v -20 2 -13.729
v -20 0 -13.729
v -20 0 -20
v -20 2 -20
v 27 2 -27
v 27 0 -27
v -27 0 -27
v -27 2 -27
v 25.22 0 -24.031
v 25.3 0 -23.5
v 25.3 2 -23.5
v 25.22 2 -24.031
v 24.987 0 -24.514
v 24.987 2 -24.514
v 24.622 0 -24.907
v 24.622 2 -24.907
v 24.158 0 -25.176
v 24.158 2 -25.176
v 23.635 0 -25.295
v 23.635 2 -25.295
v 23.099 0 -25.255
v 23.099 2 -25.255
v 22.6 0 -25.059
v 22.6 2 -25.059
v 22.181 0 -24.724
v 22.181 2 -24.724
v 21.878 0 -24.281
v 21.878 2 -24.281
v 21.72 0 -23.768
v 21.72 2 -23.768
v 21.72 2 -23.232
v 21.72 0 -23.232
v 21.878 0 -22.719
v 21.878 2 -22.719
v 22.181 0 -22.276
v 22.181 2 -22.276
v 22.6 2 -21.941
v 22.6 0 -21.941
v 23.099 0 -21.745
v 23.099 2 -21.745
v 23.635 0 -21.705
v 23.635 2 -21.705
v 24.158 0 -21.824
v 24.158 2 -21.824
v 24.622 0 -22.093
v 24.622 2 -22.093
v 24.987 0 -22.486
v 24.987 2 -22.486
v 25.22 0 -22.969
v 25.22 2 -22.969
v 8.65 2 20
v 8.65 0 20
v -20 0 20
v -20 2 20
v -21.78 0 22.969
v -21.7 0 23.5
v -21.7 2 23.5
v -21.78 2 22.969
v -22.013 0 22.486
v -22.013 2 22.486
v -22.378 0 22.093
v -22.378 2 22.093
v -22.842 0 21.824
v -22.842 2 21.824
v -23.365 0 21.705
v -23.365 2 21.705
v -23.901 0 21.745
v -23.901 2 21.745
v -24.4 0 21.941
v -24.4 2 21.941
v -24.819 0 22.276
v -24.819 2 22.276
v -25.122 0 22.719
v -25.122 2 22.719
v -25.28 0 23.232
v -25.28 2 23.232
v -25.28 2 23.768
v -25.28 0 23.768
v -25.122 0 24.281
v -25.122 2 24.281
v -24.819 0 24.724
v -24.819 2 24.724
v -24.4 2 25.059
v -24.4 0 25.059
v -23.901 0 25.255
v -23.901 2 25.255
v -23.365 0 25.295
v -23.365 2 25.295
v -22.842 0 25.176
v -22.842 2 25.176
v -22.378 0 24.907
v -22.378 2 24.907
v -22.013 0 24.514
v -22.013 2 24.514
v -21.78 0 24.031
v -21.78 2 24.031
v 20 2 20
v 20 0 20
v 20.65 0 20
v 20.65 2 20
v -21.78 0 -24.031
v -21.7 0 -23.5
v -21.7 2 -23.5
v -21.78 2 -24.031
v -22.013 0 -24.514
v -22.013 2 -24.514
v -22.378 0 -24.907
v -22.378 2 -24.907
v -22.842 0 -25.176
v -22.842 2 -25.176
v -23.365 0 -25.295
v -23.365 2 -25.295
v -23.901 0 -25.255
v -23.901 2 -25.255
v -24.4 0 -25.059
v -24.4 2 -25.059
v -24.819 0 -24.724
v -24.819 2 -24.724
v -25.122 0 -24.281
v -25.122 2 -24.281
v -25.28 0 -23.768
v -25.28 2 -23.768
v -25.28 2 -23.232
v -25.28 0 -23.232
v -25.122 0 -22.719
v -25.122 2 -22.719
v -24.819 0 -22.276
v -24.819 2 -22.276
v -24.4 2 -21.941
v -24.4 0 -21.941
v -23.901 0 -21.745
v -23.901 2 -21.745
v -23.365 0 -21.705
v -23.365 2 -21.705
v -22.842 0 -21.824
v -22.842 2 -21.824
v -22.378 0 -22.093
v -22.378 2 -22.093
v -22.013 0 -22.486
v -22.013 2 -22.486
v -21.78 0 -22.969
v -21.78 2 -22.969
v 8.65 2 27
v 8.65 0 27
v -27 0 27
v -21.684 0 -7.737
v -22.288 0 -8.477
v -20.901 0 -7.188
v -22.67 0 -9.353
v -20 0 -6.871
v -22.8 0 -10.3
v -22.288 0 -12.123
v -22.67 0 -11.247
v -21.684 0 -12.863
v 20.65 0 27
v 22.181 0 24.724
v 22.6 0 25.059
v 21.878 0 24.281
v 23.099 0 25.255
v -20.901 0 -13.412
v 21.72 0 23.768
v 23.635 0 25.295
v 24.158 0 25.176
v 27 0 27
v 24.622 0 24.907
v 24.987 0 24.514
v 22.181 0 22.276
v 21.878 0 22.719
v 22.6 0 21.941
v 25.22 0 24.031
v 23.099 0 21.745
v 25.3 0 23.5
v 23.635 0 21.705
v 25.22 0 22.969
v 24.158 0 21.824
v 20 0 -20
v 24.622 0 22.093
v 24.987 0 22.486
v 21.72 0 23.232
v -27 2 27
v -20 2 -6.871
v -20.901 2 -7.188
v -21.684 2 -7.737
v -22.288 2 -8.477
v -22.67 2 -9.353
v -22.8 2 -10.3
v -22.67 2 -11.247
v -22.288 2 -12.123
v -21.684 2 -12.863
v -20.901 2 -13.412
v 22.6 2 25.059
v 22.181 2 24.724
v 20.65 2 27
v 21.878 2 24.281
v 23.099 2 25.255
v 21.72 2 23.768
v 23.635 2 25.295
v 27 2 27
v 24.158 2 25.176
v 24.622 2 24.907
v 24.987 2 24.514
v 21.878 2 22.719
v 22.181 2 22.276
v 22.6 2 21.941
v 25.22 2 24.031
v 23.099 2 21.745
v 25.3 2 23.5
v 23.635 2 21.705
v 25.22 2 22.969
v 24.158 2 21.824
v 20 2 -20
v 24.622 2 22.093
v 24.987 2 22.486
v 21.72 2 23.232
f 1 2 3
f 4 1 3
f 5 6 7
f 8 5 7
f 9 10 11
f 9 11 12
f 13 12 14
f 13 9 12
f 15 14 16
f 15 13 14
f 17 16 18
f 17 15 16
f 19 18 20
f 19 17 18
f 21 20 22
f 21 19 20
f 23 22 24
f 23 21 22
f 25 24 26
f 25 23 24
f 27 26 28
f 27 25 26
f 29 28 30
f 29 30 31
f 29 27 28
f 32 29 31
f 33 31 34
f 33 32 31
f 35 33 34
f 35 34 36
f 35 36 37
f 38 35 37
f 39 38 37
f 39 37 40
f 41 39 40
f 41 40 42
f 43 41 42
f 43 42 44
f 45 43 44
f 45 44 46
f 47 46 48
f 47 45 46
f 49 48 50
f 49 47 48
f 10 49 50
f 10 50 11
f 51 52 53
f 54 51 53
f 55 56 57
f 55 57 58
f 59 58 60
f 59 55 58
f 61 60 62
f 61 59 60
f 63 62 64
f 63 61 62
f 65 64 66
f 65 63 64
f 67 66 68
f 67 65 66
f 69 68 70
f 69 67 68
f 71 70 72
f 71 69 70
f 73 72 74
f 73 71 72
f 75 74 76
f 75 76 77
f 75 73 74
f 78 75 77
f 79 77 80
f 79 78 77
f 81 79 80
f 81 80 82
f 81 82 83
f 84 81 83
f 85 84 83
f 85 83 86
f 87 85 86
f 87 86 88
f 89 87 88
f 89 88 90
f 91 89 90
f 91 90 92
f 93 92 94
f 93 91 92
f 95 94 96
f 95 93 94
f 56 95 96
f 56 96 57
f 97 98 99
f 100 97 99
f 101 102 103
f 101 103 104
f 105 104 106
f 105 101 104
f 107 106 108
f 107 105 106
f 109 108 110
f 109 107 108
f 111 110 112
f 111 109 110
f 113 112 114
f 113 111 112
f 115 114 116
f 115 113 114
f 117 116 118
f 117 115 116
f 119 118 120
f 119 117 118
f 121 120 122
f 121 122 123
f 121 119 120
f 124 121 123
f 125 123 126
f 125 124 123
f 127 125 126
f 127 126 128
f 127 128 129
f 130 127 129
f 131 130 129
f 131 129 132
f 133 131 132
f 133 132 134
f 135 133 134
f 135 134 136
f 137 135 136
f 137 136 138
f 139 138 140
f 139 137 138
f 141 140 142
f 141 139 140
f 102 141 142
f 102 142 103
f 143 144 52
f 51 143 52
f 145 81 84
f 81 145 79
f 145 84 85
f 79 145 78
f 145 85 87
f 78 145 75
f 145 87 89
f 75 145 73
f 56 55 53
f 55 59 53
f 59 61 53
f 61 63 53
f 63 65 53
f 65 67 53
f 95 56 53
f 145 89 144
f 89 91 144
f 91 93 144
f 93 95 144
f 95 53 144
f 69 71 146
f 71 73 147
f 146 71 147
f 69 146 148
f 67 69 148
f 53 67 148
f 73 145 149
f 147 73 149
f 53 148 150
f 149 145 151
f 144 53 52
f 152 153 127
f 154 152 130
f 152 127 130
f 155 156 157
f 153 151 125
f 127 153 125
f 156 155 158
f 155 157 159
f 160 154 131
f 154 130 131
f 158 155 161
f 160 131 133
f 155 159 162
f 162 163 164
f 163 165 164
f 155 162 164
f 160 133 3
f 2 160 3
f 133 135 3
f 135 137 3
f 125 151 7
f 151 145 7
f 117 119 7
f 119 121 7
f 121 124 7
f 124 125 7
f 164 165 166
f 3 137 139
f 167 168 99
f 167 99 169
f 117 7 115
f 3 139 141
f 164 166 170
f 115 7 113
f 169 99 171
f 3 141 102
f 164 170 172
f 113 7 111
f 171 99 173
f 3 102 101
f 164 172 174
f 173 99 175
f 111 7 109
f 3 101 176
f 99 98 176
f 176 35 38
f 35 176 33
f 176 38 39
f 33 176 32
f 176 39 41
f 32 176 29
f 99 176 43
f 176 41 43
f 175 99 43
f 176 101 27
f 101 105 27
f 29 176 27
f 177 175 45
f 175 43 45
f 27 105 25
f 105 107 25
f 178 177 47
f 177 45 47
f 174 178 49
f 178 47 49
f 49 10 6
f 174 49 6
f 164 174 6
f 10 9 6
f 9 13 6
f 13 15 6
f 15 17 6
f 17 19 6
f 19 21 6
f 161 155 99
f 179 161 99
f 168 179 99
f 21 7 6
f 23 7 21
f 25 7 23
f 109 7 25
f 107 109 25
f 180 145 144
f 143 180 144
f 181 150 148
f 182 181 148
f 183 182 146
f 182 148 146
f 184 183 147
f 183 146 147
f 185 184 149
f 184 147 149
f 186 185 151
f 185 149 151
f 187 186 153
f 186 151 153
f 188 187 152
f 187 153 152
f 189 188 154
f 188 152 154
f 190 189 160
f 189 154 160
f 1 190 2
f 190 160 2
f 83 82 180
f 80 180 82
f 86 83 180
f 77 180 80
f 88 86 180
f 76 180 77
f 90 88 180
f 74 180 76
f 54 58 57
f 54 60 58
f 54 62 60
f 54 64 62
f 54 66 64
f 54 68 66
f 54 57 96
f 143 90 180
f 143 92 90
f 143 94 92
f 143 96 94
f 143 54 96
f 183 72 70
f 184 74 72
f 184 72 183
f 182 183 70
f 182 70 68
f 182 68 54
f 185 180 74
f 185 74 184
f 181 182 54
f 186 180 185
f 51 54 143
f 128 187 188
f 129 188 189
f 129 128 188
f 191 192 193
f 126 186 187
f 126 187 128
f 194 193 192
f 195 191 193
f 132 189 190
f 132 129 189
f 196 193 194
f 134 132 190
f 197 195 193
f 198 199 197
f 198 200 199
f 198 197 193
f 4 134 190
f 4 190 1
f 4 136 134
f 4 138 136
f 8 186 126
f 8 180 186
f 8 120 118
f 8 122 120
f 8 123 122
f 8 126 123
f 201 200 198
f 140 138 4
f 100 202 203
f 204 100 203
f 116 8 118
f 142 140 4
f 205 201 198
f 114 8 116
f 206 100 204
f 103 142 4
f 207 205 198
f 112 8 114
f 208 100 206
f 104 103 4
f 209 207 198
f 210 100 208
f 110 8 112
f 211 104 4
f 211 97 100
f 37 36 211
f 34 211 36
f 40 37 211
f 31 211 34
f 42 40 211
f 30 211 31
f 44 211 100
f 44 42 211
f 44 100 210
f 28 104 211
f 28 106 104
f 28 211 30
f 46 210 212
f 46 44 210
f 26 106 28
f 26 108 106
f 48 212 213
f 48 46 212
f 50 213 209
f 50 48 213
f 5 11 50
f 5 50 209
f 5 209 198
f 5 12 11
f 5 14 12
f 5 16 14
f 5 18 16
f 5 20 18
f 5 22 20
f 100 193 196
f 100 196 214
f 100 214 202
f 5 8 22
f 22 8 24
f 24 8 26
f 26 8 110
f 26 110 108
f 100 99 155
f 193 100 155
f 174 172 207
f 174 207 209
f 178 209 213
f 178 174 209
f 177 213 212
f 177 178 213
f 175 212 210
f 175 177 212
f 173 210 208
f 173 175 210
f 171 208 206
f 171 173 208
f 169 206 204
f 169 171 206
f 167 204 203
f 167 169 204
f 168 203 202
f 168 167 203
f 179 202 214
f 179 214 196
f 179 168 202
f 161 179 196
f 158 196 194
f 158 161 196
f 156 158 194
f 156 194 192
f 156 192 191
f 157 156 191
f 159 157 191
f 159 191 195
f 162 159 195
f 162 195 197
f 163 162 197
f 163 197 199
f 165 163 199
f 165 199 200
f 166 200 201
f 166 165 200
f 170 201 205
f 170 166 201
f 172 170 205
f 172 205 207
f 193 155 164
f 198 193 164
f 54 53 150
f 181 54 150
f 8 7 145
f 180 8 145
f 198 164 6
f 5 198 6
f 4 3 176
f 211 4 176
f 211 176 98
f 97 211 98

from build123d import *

# Parameters (mm, degrees)
SKETCH_3_R      = 1.8
EXTRUDE_2_DEPTH = 2


with BuildPart() as part:
    # 草图3 → 凸台-拉伸2 (new body)
    with BuildSketch(Plane(origin=(0, 0, 0), x_dir=(1, 0, 0), z_dir=(0, 1, 0))):
        with BuildLine():
            Line((20, 20), (20, -20))
            Line((20, -20), (20.65, -20))
            Line((20.65, -20), (20.65, -27))
            Line((20.65, -27), (27, -27))
            Line((27, -27), (27, 27))
            Line((27, 27), (-27, 27))
            Line((-27, 27), (-27, -27))
            Line((-27, -27), (8.65, -27))
            Line((8.65, -27), (8.65, -20))
            Line((8.65, -20), (-20, -20))
            Line((-20, -20), (-20, 6.87071436))
            ThreePointArc((-20, 6.87071436), (-22.8, 10.3), (-20, 13.72928564))
            Line((-20, 13.72928564), (-20, 20))
            Line((-20, 20), (-16.7, 20))
            Line((-16.7, 20), (-10.4, 20))
            Line((-10.4, 20), (-4.1, 20))
            Line((-4.1, 20), (20, 20))
        make_face()
        with Locations((-23.5, -23.5)):
            Circle(SKETCH_3_R, mode=Mode.SUBTRACT)
        with Locations((23.5, -23.5)):
            Circle(SKETCH_3_R, mode=Mode.SUBTRACT)
        with Locations((-23.5, 23.5)):
            Circle(SKETCH_3_R, mode=Mode.SUBTRACT)
        with Locations((23.5, 23.5)):
            Circle(SKETCH_3_R, mode=Mode.SUBTRACT)
    extrude(amount=EXTRUDE_2_DEPTH)


solid = part.part
